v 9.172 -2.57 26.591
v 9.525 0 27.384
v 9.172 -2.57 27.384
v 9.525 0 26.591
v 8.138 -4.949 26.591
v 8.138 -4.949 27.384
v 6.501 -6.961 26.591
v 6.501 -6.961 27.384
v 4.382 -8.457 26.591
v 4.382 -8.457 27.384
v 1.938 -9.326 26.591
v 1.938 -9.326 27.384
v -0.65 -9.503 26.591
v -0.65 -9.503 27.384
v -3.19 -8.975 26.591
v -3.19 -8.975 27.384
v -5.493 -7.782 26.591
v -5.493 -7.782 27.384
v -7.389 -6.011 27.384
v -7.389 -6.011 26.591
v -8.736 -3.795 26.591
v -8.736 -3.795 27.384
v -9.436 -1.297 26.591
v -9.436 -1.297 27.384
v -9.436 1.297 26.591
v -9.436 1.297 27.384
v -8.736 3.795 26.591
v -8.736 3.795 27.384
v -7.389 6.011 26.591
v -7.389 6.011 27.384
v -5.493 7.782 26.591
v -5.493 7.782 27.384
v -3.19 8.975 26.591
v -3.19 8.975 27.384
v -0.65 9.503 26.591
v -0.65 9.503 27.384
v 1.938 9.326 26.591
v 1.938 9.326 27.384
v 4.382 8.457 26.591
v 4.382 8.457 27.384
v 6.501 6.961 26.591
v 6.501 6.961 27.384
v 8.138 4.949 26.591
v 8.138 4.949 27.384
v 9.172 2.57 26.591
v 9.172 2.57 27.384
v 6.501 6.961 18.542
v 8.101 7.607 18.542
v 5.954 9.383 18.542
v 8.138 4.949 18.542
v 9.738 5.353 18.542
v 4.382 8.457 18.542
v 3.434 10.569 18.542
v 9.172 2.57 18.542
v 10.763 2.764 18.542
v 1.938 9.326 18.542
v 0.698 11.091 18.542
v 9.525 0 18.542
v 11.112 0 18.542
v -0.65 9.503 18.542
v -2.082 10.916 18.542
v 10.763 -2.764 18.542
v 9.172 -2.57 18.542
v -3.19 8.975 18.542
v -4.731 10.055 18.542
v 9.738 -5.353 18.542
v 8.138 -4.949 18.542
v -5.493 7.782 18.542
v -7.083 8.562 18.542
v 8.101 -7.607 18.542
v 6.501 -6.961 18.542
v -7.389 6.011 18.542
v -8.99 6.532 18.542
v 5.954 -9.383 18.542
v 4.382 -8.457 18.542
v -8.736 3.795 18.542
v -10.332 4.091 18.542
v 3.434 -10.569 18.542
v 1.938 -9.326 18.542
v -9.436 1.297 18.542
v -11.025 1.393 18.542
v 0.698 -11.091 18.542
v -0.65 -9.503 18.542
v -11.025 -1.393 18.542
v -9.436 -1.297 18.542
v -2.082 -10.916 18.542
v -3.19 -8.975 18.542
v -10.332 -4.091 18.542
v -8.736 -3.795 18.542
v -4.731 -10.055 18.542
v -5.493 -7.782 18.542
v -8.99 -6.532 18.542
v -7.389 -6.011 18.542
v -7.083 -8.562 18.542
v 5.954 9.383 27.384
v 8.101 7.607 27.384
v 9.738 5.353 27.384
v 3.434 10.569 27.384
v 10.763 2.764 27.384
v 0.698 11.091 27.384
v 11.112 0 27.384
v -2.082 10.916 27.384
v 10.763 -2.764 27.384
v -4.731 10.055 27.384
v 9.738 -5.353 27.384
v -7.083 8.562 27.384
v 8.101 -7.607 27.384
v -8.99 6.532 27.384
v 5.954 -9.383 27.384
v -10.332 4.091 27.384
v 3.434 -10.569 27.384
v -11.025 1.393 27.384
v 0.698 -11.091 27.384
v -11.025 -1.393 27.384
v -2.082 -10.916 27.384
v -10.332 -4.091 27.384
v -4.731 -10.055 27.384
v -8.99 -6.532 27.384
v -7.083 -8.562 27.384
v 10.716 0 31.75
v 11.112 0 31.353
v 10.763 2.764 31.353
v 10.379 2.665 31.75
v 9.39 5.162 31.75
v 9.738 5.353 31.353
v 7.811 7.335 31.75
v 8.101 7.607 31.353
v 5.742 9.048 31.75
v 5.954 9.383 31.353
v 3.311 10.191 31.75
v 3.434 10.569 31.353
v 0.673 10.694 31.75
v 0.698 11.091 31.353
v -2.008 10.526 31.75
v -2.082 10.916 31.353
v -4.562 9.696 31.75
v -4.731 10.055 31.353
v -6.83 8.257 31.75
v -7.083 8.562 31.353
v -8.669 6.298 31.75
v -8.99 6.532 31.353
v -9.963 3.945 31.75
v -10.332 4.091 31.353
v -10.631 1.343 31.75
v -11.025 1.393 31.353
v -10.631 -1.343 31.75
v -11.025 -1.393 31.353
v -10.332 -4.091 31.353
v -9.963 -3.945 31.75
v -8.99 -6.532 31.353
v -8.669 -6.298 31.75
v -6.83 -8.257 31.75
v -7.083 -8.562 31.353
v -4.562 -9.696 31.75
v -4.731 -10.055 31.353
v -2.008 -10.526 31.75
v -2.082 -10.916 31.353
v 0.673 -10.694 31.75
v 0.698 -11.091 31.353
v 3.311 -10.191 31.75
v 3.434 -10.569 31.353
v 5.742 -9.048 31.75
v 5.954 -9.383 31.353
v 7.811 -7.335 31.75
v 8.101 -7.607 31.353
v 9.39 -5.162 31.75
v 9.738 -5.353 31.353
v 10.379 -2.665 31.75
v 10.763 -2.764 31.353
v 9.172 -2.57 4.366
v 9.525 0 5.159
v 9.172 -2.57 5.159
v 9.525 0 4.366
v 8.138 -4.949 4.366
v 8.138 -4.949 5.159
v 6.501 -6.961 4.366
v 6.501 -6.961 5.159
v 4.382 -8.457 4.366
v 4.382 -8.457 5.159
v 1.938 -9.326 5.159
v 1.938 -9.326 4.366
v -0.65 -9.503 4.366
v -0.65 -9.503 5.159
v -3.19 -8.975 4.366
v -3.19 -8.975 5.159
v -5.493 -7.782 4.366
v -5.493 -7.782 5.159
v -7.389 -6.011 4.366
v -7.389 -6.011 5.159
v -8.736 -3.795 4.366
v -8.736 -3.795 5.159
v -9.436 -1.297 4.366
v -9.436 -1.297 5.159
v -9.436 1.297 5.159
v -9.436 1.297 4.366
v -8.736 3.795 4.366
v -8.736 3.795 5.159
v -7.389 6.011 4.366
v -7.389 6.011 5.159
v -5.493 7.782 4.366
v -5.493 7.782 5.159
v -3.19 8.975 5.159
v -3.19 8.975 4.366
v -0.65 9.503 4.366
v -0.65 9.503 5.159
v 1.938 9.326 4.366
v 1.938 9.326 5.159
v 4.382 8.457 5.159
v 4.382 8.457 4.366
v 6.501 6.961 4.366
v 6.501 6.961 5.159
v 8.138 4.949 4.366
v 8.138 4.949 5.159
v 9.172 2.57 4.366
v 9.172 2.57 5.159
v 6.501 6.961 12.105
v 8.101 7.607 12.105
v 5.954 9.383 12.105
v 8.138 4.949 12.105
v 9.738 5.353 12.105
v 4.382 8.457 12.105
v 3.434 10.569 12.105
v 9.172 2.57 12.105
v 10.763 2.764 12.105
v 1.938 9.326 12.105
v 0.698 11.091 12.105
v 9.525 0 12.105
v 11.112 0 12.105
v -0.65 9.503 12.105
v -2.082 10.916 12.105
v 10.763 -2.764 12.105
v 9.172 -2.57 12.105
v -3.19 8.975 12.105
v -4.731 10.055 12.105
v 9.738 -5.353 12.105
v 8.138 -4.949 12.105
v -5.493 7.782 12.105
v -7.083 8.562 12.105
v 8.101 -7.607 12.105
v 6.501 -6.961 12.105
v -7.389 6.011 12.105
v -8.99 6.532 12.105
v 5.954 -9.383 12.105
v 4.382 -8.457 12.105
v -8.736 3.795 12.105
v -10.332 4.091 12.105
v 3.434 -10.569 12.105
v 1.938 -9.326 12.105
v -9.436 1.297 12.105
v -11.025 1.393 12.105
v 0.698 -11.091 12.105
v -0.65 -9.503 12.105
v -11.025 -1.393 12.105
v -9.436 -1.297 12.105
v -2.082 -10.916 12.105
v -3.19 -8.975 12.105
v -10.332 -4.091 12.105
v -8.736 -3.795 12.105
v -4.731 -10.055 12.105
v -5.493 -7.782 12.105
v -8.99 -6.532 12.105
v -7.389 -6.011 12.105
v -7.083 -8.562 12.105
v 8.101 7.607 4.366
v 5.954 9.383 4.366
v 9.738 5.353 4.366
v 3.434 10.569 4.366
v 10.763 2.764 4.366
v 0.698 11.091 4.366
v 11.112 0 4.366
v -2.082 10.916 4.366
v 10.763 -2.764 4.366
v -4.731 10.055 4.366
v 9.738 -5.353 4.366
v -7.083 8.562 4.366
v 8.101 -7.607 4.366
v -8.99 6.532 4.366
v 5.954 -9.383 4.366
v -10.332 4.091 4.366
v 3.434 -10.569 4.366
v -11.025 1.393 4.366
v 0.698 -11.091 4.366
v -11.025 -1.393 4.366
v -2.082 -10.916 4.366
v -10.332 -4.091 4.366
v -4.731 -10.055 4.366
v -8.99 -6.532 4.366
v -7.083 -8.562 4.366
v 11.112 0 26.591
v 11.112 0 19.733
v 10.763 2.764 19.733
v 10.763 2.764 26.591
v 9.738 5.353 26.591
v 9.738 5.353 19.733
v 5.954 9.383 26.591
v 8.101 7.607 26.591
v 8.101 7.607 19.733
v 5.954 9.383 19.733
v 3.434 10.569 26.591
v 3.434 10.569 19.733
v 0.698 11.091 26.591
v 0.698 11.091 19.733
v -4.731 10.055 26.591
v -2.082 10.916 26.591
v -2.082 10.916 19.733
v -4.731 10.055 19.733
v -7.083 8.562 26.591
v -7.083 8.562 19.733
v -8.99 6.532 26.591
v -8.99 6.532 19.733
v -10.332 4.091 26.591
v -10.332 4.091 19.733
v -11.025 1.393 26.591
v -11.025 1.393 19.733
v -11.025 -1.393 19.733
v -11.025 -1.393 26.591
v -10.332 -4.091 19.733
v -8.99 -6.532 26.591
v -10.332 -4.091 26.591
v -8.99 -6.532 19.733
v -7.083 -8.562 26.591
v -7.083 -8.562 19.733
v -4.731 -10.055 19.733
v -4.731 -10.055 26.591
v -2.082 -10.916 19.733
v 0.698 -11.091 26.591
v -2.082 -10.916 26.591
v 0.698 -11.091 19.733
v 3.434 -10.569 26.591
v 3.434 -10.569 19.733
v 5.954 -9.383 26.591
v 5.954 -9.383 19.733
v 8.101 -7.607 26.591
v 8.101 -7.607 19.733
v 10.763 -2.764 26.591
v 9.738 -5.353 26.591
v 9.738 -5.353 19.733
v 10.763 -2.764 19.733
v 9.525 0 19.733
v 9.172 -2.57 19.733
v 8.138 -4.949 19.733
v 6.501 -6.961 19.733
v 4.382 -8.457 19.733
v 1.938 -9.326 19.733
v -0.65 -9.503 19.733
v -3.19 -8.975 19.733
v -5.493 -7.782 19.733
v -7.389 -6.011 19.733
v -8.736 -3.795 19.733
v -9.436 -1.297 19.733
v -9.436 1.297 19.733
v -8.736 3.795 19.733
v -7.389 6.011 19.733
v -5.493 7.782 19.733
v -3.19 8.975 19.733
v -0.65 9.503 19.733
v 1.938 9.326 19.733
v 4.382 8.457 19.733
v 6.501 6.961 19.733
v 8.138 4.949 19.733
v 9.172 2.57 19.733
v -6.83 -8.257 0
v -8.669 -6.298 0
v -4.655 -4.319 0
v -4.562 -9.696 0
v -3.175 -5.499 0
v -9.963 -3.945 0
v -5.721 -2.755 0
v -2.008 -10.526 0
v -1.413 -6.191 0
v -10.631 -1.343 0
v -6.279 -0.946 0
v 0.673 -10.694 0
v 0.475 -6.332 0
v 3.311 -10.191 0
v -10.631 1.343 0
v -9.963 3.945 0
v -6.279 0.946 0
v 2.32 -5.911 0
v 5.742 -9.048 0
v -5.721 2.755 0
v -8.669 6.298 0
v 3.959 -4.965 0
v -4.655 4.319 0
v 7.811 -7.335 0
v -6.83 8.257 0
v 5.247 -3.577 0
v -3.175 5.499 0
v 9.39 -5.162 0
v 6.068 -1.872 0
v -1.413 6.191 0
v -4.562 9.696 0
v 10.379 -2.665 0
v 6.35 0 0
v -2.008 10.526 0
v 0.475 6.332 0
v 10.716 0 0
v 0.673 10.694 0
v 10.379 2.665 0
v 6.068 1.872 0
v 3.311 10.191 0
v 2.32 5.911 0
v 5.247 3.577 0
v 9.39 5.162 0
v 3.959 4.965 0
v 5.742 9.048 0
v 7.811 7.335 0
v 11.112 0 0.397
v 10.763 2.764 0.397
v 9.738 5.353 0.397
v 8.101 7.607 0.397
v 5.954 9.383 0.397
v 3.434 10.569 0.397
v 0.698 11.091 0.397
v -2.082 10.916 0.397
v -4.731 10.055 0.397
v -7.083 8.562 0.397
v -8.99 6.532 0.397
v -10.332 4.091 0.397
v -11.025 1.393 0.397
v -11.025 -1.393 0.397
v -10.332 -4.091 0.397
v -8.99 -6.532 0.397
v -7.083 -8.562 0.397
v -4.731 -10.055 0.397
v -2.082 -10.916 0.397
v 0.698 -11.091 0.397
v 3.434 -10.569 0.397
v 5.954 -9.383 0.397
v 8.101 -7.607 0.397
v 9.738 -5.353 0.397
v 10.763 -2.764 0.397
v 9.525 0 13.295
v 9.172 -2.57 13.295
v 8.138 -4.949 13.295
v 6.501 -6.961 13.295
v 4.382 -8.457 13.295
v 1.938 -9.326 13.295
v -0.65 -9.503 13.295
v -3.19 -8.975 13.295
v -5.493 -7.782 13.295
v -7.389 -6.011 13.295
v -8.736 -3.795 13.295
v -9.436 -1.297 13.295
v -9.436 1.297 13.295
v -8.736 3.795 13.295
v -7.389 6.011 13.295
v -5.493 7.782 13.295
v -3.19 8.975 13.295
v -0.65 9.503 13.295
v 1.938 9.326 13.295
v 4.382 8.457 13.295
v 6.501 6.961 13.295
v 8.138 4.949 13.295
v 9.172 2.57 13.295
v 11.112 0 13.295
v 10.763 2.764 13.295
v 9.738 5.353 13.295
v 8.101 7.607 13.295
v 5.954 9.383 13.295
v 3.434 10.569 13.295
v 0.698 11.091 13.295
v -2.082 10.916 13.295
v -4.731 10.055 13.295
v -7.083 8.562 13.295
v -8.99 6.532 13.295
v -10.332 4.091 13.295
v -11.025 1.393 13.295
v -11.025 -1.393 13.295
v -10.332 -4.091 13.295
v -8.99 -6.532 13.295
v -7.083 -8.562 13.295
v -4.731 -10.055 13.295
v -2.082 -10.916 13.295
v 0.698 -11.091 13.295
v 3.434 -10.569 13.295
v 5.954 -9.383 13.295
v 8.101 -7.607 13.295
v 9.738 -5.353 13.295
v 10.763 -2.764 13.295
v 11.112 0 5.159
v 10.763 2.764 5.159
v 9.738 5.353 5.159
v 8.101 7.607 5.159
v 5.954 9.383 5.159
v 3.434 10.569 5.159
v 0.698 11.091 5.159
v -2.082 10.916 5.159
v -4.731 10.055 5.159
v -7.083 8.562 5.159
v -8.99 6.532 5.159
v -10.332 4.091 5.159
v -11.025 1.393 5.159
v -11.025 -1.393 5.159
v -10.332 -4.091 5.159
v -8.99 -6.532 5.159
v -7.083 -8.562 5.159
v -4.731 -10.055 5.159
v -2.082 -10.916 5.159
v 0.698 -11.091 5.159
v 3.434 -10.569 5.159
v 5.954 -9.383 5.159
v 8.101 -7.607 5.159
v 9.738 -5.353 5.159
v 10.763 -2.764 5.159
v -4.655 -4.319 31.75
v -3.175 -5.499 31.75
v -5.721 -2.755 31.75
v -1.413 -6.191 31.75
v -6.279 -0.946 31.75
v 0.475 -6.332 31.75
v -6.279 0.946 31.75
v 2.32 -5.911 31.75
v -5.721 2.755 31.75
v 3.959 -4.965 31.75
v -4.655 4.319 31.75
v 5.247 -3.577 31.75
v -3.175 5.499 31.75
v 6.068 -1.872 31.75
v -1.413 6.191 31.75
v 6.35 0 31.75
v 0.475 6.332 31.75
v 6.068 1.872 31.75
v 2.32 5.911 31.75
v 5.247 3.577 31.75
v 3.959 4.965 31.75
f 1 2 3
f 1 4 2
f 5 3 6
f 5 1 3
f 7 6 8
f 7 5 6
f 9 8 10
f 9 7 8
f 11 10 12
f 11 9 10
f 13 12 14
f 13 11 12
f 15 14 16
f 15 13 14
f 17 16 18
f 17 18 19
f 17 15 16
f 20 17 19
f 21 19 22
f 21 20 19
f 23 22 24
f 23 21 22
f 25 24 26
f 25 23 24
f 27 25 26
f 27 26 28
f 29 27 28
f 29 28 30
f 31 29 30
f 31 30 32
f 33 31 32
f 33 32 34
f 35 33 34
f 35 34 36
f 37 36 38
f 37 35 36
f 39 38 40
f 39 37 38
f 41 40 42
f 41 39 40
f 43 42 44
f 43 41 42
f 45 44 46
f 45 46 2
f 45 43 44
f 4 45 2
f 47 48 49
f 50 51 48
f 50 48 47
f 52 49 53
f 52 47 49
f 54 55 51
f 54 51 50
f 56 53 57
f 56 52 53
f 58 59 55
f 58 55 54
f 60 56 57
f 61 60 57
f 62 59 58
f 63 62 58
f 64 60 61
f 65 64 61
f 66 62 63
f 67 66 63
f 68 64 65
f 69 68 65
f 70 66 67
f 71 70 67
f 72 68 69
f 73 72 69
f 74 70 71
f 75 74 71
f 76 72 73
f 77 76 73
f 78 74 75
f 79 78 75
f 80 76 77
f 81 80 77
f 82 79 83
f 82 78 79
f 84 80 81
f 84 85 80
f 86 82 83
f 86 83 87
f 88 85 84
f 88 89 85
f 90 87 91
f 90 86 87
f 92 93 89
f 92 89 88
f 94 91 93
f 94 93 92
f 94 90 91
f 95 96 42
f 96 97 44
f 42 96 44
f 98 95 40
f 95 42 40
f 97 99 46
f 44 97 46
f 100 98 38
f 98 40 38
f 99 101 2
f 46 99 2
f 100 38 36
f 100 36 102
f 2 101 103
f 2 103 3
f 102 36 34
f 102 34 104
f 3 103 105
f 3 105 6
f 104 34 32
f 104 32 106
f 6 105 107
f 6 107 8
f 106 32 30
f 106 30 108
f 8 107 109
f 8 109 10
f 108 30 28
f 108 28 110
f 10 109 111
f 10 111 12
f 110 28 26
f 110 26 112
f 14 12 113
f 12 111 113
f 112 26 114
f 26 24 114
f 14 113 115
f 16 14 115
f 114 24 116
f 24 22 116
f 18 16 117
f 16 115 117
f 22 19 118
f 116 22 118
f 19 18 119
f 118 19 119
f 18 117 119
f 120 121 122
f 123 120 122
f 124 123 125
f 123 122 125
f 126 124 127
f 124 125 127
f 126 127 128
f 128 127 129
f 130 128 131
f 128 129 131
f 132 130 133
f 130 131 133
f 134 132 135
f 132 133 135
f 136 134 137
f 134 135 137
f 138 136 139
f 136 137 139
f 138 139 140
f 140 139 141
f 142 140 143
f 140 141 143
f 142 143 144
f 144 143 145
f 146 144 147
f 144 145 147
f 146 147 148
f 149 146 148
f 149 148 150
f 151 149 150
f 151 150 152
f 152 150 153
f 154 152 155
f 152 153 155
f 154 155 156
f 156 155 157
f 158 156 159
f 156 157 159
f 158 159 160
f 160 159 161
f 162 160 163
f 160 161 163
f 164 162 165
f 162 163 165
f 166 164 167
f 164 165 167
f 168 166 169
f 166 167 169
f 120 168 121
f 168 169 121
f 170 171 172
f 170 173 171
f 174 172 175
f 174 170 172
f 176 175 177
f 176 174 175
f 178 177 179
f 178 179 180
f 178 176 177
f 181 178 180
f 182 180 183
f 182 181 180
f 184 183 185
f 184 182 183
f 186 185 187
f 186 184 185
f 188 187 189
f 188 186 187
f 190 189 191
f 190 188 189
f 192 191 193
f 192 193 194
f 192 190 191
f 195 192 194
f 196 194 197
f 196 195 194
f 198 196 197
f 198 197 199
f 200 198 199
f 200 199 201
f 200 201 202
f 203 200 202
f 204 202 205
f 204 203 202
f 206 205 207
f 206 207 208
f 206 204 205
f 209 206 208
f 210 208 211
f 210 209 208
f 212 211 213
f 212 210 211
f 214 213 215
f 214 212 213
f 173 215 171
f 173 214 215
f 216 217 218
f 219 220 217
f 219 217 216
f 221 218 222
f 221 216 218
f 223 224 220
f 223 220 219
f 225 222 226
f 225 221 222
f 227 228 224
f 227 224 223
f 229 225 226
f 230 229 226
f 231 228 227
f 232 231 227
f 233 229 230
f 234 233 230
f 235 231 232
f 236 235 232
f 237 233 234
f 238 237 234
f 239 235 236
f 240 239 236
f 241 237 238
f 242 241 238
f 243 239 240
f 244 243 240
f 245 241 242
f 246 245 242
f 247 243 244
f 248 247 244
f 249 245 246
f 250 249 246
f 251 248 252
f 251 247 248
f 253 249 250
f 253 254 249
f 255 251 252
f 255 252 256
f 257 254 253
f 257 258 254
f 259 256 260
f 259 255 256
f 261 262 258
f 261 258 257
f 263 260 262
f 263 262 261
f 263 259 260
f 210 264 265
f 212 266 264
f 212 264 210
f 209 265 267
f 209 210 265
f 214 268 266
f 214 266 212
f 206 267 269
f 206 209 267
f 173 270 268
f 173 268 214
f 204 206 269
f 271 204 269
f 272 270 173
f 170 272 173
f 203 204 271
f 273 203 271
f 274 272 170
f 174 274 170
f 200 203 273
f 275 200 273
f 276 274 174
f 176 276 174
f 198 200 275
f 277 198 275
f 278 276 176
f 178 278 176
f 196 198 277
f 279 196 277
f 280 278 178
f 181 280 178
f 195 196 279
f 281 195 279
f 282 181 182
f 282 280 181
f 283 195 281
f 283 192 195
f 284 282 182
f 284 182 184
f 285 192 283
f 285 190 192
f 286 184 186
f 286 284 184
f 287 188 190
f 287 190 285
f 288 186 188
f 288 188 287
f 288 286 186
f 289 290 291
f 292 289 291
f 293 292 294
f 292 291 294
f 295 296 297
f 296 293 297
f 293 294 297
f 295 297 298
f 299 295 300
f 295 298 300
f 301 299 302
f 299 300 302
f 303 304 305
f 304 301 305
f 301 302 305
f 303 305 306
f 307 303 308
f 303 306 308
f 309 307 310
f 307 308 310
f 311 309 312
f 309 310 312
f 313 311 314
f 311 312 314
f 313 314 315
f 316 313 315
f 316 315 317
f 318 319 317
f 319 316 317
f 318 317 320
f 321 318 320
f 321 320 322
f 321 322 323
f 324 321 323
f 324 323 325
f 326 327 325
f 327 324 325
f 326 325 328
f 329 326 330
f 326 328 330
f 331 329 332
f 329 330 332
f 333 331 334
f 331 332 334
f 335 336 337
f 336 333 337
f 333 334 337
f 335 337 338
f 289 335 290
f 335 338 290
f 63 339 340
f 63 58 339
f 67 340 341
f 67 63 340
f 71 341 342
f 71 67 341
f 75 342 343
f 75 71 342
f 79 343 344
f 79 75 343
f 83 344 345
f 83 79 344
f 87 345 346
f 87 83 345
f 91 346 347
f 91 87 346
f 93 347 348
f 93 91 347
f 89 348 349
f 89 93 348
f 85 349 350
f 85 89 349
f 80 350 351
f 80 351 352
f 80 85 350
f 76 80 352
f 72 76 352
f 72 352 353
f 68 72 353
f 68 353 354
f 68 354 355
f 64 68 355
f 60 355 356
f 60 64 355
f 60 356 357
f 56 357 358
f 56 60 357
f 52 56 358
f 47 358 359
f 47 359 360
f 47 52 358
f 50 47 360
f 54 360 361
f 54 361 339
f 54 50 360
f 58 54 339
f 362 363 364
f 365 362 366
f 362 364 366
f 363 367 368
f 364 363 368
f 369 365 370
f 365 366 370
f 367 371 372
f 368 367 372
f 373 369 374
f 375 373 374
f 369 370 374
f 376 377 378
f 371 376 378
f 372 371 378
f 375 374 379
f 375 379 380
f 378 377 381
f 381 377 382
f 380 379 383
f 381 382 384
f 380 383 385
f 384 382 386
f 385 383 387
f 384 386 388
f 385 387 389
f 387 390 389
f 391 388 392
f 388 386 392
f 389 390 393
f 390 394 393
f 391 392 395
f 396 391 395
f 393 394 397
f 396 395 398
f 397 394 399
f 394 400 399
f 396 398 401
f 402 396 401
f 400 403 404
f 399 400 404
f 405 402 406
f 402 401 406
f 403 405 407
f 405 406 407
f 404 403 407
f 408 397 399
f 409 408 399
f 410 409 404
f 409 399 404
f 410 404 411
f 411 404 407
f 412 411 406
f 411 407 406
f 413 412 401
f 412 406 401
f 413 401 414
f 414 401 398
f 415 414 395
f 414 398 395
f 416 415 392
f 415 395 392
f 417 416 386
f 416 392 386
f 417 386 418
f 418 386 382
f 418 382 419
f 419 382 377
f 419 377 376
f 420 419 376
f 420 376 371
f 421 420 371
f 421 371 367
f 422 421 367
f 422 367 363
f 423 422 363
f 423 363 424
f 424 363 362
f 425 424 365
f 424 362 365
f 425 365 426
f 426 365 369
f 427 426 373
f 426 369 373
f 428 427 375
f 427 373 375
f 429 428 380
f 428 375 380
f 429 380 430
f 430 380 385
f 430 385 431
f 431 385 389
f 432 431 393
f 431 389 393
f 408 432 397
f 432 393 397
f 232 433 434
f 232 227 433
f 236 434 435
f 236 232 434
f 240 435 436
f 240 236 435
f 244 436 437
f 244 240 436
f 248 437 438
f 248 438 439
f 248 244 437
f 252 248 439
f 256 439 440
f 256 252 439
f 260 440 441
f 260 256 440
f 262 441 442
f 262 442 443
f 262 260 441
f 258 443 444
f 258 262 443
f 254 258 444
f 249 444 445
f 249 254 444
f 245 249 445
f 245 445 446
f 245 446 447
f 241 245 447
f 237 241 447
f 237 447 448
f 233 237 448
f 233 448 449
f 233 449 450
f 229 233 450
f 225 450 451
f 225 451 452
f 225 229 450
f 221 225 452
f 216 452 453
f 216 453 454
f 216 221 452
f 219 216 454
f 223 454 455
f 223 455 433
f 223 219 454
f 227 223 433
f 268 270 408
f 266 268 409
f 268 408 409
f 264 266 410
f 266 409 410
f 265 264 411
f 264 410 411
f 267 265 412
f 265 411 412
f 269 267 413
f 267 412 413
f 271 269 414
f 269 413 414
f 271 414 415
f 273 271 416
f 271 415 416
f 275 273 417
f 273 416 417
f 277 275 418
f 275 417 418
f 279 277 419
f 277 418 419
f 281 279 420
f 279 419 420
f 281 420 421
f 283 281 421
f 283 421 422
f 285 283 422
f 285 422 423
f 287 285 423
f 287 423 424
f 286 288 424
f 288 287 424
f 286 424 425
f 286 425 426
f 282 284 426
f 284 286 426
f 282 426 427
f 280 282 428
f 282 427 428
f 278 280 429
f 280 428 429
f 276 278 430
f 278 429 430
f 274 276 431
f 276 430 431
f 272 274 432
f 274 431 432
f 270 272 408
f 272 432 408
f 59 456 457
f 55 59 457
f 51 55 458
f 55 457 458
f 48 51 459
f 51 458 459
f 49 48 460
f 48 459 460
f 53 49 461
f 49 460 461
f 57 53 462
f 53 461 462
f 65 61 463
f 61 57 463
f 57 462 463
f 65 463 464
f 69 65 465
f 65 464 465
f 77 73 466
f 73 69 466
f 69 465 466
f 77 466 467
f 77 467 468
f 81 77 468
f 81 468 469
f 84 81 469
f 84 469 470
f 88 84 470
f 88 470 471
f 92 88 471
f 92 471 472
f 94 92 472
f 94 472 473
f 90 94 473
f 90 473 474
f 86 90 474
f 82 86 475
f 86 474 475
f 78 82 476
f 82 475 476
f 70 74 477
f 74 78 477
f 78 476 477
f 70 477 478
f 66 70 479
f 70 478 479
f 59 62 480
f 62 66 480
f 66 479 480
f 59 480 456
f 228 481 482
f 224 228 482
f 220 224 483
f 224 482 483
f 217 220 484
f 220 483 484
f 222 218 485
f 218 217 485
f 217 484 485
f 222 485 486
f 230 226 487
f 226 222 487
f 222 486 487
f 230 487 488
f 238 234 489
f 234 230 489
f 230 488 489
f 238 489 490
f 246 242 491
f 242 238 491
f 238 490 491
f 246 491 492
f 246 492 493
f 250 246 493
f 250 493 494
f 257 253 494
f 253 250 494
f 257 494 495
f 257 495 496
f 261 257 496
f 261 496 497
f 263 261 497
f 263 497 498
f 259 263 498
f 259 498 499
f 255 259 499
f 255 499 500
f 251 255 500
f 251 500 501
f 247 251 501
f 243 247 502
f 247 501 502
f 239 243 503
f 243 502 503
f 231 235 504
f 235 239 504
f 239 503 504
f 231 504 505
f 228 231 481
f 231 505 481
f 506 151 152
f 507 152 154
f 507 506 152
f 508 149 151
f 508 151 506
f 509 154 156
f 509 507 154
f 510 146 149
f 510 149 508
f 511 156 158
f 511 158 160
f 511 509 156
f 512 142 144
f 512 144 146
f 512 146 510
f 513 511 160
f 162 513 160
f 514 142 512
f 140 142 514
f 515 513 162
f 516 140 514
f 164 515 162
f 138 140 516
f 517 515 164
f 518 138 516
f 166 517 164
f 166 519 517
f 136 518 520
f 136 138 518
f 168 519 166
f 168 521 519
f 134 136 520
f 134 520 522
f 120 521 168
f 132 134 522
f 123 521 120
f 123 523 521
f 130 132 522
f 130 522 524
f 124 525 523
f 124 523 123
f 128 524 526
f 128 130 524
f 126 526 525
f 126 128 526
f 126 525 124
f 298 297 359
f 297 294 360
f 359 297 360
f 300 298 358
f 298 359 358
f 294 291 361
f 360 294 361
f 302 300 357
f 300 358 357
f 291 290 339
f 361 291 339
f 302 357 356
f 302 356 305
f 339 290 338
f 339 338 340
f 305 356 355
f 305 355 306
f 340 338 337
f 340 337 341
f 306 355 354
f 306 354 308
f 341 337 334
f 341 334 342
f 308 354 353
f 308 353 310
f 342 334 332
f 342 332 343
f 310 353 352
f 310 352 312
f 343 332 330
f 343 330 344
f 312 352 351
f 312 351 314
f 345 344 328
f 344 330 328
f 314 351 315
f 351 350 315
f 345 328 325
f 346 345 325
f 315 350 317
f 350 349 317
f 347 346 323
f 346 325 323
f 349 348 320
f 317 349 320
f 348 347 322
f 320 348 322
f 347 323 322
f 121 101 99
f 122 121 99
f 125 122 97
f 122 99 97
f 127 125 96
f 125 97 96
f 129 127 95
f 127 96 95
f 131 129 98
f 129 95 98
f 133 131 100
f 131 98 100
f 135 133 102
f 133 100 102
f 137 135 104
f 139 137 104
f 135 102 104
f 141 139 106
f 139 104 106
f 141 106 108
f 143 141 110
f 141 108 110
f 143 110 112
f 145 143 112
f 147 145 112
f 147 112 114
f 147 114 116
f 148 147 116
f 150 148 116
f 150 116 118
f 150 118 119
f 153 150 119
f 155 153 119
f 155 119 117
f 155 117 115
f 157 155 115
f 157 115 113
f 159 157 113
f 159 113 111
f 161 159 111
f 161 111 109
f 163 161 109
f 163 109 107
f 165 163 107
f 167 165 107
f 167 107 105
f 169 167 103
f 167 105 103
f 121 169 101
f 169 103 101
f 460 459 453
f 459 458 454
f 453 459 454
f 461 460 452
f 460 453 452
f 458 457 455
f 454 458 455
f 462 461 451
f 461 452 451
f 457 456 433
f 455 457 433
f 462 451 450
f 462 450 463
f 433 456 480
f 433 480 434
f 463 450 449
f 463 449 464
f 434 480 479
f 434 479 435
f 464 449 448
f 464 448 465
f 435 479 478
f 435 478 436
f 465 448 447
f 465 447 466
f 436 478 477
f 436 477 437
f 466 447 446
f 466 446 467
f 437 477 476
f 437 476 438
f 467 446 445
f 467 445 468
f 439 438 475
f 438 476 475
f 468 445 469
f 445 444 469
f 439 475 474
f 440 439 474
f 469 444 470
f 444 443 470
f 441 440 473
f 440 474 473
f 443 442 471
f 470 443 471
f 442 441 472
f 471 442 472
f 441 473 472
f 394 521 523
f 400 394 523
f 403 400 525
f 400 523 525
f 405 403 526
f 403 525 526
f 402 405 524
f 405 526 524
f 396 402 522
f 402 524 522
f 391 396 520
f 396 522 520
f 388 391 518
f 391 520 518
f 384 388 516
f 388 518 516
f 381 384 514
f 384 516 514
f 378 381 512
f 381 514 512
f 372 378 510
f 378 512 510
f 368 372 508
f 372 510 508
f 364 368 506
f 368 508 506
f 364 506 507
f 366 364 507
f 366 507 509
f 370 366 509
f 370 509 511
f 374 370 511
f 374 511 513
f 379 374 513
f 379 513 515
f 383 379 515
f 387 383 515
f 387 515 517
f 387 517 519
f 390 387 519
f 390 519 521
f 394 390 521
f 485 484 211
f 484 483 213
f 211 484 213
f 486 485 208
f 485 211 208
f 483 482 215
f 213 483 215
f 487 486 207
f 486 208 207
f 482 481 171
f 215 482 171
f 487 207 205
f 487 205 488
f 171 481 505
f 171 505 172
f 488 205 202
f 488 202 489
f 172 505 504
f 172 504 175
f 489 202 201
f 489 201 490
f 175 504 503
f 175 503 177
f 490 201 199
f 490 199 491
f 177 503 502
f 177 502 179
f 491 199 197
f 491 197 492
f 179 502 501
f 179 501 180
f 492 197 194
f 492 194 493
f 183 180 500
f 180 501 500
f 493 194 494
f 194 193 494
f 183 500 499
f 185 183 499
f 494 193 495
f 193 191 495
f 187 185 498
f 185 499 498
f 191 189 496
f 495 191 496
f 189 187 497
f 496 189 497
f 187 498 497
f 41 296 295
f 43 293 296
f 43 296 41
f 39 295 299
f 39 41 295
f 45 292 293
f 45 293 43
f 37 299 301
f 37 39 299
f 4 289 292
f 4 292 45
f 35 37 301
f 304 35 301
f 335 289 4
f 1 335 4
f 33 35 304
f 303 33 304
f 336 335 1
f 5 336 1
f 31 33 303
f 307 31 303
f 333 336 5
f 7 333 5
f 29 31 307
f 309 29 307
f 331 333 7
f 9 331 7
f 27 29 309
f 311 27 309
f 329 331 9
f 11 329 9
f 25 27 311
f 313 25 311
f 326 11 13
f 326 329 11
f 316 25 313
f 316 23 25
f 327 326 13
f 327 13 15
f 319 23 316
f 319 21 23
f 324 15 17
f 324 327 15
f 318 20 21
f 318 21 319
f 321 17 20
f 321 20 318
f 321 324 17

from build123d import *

# Parameters (mm, degrees)
SKETCH2_R           = 11.1125
BOSS_EXTRUDE1_DEPTH = 31.75
SKETCH3_R           = 6.35
CUT_EXTRUDE1_DEPTH  = 32.75
SKETCH4_W           = 3.175
SKETCH4_H           = 0.79375
CHAMFER1_SIZE       = 0.396875
SKETCH5_W           = 3.175
SKETCH5_H           = 1.190625


with BuildPart() as part:
    # Sketch2 → Boss-Extrude1 (new body)
    with BuildSketch(Plane.XY):
        Circle(SKETCH2_R)
    extrude(amount=BOSS_EXTRUDE1_DEPTH)

    # Sketch3 → Cut-Extrude1 (cut, through all)
    with BuildSketch(Plane.XY.offset(31.75)):
        Circle(SKETCH3_R)
    extrude(amount=-CUT_EXTRUDE1_DEPTH, mode=Mode.SUBTRACT)

    # Sketch4 → Cut-Revolve1 (revolve, cut)
    with BuildSketch(Plane(origin=(0, 0, 0), x_dir=(1, 0, 0), z_dir=(0, 1, 0))):
        with Locations((11.1125, -26.9875)):
            Rectangle(SKETCH4_W, SKETCH4_H)
        with Locations((11.1125, -4.7625)):
            Rectangle(SKETCH4_W, SKETCH4_H)
    revolve(axis=Axis((0, 0, 31.75), (0, 0, -1)), mode=Mode.SUBTRACT)

    # Chamfer1
    chamfer1_edges = [part.edges().sort_by_distance(p)[0] for p in [
        (-11.1125, 0, 0),
        (-11.1125, 0, 31.75),
    ]]
    chamfer(chamfer1_edges, length=CHAMFER1_SIZE)

    # Sketch5 → Cut-Revolve2 (revolve, cut)
    with BuildSketch(Plane(origin=(0, 0, 0), x_dir=(1, 0, 0), z_dir=(0, 1, 0))):
        with Locations((11.1125, -12.7)):
            Rectangle(SKETCH5_W, SKETCH5_H)
        with Locations((11.1125, -19.137777624)):
            Rectangle(SKETCH5_W, SKETCH5_H)
    revolve(axis=Axis((0, 0, 31.75), (0, 0, -1)), mode=Mode.SUBTRACT)


solid = part.part
